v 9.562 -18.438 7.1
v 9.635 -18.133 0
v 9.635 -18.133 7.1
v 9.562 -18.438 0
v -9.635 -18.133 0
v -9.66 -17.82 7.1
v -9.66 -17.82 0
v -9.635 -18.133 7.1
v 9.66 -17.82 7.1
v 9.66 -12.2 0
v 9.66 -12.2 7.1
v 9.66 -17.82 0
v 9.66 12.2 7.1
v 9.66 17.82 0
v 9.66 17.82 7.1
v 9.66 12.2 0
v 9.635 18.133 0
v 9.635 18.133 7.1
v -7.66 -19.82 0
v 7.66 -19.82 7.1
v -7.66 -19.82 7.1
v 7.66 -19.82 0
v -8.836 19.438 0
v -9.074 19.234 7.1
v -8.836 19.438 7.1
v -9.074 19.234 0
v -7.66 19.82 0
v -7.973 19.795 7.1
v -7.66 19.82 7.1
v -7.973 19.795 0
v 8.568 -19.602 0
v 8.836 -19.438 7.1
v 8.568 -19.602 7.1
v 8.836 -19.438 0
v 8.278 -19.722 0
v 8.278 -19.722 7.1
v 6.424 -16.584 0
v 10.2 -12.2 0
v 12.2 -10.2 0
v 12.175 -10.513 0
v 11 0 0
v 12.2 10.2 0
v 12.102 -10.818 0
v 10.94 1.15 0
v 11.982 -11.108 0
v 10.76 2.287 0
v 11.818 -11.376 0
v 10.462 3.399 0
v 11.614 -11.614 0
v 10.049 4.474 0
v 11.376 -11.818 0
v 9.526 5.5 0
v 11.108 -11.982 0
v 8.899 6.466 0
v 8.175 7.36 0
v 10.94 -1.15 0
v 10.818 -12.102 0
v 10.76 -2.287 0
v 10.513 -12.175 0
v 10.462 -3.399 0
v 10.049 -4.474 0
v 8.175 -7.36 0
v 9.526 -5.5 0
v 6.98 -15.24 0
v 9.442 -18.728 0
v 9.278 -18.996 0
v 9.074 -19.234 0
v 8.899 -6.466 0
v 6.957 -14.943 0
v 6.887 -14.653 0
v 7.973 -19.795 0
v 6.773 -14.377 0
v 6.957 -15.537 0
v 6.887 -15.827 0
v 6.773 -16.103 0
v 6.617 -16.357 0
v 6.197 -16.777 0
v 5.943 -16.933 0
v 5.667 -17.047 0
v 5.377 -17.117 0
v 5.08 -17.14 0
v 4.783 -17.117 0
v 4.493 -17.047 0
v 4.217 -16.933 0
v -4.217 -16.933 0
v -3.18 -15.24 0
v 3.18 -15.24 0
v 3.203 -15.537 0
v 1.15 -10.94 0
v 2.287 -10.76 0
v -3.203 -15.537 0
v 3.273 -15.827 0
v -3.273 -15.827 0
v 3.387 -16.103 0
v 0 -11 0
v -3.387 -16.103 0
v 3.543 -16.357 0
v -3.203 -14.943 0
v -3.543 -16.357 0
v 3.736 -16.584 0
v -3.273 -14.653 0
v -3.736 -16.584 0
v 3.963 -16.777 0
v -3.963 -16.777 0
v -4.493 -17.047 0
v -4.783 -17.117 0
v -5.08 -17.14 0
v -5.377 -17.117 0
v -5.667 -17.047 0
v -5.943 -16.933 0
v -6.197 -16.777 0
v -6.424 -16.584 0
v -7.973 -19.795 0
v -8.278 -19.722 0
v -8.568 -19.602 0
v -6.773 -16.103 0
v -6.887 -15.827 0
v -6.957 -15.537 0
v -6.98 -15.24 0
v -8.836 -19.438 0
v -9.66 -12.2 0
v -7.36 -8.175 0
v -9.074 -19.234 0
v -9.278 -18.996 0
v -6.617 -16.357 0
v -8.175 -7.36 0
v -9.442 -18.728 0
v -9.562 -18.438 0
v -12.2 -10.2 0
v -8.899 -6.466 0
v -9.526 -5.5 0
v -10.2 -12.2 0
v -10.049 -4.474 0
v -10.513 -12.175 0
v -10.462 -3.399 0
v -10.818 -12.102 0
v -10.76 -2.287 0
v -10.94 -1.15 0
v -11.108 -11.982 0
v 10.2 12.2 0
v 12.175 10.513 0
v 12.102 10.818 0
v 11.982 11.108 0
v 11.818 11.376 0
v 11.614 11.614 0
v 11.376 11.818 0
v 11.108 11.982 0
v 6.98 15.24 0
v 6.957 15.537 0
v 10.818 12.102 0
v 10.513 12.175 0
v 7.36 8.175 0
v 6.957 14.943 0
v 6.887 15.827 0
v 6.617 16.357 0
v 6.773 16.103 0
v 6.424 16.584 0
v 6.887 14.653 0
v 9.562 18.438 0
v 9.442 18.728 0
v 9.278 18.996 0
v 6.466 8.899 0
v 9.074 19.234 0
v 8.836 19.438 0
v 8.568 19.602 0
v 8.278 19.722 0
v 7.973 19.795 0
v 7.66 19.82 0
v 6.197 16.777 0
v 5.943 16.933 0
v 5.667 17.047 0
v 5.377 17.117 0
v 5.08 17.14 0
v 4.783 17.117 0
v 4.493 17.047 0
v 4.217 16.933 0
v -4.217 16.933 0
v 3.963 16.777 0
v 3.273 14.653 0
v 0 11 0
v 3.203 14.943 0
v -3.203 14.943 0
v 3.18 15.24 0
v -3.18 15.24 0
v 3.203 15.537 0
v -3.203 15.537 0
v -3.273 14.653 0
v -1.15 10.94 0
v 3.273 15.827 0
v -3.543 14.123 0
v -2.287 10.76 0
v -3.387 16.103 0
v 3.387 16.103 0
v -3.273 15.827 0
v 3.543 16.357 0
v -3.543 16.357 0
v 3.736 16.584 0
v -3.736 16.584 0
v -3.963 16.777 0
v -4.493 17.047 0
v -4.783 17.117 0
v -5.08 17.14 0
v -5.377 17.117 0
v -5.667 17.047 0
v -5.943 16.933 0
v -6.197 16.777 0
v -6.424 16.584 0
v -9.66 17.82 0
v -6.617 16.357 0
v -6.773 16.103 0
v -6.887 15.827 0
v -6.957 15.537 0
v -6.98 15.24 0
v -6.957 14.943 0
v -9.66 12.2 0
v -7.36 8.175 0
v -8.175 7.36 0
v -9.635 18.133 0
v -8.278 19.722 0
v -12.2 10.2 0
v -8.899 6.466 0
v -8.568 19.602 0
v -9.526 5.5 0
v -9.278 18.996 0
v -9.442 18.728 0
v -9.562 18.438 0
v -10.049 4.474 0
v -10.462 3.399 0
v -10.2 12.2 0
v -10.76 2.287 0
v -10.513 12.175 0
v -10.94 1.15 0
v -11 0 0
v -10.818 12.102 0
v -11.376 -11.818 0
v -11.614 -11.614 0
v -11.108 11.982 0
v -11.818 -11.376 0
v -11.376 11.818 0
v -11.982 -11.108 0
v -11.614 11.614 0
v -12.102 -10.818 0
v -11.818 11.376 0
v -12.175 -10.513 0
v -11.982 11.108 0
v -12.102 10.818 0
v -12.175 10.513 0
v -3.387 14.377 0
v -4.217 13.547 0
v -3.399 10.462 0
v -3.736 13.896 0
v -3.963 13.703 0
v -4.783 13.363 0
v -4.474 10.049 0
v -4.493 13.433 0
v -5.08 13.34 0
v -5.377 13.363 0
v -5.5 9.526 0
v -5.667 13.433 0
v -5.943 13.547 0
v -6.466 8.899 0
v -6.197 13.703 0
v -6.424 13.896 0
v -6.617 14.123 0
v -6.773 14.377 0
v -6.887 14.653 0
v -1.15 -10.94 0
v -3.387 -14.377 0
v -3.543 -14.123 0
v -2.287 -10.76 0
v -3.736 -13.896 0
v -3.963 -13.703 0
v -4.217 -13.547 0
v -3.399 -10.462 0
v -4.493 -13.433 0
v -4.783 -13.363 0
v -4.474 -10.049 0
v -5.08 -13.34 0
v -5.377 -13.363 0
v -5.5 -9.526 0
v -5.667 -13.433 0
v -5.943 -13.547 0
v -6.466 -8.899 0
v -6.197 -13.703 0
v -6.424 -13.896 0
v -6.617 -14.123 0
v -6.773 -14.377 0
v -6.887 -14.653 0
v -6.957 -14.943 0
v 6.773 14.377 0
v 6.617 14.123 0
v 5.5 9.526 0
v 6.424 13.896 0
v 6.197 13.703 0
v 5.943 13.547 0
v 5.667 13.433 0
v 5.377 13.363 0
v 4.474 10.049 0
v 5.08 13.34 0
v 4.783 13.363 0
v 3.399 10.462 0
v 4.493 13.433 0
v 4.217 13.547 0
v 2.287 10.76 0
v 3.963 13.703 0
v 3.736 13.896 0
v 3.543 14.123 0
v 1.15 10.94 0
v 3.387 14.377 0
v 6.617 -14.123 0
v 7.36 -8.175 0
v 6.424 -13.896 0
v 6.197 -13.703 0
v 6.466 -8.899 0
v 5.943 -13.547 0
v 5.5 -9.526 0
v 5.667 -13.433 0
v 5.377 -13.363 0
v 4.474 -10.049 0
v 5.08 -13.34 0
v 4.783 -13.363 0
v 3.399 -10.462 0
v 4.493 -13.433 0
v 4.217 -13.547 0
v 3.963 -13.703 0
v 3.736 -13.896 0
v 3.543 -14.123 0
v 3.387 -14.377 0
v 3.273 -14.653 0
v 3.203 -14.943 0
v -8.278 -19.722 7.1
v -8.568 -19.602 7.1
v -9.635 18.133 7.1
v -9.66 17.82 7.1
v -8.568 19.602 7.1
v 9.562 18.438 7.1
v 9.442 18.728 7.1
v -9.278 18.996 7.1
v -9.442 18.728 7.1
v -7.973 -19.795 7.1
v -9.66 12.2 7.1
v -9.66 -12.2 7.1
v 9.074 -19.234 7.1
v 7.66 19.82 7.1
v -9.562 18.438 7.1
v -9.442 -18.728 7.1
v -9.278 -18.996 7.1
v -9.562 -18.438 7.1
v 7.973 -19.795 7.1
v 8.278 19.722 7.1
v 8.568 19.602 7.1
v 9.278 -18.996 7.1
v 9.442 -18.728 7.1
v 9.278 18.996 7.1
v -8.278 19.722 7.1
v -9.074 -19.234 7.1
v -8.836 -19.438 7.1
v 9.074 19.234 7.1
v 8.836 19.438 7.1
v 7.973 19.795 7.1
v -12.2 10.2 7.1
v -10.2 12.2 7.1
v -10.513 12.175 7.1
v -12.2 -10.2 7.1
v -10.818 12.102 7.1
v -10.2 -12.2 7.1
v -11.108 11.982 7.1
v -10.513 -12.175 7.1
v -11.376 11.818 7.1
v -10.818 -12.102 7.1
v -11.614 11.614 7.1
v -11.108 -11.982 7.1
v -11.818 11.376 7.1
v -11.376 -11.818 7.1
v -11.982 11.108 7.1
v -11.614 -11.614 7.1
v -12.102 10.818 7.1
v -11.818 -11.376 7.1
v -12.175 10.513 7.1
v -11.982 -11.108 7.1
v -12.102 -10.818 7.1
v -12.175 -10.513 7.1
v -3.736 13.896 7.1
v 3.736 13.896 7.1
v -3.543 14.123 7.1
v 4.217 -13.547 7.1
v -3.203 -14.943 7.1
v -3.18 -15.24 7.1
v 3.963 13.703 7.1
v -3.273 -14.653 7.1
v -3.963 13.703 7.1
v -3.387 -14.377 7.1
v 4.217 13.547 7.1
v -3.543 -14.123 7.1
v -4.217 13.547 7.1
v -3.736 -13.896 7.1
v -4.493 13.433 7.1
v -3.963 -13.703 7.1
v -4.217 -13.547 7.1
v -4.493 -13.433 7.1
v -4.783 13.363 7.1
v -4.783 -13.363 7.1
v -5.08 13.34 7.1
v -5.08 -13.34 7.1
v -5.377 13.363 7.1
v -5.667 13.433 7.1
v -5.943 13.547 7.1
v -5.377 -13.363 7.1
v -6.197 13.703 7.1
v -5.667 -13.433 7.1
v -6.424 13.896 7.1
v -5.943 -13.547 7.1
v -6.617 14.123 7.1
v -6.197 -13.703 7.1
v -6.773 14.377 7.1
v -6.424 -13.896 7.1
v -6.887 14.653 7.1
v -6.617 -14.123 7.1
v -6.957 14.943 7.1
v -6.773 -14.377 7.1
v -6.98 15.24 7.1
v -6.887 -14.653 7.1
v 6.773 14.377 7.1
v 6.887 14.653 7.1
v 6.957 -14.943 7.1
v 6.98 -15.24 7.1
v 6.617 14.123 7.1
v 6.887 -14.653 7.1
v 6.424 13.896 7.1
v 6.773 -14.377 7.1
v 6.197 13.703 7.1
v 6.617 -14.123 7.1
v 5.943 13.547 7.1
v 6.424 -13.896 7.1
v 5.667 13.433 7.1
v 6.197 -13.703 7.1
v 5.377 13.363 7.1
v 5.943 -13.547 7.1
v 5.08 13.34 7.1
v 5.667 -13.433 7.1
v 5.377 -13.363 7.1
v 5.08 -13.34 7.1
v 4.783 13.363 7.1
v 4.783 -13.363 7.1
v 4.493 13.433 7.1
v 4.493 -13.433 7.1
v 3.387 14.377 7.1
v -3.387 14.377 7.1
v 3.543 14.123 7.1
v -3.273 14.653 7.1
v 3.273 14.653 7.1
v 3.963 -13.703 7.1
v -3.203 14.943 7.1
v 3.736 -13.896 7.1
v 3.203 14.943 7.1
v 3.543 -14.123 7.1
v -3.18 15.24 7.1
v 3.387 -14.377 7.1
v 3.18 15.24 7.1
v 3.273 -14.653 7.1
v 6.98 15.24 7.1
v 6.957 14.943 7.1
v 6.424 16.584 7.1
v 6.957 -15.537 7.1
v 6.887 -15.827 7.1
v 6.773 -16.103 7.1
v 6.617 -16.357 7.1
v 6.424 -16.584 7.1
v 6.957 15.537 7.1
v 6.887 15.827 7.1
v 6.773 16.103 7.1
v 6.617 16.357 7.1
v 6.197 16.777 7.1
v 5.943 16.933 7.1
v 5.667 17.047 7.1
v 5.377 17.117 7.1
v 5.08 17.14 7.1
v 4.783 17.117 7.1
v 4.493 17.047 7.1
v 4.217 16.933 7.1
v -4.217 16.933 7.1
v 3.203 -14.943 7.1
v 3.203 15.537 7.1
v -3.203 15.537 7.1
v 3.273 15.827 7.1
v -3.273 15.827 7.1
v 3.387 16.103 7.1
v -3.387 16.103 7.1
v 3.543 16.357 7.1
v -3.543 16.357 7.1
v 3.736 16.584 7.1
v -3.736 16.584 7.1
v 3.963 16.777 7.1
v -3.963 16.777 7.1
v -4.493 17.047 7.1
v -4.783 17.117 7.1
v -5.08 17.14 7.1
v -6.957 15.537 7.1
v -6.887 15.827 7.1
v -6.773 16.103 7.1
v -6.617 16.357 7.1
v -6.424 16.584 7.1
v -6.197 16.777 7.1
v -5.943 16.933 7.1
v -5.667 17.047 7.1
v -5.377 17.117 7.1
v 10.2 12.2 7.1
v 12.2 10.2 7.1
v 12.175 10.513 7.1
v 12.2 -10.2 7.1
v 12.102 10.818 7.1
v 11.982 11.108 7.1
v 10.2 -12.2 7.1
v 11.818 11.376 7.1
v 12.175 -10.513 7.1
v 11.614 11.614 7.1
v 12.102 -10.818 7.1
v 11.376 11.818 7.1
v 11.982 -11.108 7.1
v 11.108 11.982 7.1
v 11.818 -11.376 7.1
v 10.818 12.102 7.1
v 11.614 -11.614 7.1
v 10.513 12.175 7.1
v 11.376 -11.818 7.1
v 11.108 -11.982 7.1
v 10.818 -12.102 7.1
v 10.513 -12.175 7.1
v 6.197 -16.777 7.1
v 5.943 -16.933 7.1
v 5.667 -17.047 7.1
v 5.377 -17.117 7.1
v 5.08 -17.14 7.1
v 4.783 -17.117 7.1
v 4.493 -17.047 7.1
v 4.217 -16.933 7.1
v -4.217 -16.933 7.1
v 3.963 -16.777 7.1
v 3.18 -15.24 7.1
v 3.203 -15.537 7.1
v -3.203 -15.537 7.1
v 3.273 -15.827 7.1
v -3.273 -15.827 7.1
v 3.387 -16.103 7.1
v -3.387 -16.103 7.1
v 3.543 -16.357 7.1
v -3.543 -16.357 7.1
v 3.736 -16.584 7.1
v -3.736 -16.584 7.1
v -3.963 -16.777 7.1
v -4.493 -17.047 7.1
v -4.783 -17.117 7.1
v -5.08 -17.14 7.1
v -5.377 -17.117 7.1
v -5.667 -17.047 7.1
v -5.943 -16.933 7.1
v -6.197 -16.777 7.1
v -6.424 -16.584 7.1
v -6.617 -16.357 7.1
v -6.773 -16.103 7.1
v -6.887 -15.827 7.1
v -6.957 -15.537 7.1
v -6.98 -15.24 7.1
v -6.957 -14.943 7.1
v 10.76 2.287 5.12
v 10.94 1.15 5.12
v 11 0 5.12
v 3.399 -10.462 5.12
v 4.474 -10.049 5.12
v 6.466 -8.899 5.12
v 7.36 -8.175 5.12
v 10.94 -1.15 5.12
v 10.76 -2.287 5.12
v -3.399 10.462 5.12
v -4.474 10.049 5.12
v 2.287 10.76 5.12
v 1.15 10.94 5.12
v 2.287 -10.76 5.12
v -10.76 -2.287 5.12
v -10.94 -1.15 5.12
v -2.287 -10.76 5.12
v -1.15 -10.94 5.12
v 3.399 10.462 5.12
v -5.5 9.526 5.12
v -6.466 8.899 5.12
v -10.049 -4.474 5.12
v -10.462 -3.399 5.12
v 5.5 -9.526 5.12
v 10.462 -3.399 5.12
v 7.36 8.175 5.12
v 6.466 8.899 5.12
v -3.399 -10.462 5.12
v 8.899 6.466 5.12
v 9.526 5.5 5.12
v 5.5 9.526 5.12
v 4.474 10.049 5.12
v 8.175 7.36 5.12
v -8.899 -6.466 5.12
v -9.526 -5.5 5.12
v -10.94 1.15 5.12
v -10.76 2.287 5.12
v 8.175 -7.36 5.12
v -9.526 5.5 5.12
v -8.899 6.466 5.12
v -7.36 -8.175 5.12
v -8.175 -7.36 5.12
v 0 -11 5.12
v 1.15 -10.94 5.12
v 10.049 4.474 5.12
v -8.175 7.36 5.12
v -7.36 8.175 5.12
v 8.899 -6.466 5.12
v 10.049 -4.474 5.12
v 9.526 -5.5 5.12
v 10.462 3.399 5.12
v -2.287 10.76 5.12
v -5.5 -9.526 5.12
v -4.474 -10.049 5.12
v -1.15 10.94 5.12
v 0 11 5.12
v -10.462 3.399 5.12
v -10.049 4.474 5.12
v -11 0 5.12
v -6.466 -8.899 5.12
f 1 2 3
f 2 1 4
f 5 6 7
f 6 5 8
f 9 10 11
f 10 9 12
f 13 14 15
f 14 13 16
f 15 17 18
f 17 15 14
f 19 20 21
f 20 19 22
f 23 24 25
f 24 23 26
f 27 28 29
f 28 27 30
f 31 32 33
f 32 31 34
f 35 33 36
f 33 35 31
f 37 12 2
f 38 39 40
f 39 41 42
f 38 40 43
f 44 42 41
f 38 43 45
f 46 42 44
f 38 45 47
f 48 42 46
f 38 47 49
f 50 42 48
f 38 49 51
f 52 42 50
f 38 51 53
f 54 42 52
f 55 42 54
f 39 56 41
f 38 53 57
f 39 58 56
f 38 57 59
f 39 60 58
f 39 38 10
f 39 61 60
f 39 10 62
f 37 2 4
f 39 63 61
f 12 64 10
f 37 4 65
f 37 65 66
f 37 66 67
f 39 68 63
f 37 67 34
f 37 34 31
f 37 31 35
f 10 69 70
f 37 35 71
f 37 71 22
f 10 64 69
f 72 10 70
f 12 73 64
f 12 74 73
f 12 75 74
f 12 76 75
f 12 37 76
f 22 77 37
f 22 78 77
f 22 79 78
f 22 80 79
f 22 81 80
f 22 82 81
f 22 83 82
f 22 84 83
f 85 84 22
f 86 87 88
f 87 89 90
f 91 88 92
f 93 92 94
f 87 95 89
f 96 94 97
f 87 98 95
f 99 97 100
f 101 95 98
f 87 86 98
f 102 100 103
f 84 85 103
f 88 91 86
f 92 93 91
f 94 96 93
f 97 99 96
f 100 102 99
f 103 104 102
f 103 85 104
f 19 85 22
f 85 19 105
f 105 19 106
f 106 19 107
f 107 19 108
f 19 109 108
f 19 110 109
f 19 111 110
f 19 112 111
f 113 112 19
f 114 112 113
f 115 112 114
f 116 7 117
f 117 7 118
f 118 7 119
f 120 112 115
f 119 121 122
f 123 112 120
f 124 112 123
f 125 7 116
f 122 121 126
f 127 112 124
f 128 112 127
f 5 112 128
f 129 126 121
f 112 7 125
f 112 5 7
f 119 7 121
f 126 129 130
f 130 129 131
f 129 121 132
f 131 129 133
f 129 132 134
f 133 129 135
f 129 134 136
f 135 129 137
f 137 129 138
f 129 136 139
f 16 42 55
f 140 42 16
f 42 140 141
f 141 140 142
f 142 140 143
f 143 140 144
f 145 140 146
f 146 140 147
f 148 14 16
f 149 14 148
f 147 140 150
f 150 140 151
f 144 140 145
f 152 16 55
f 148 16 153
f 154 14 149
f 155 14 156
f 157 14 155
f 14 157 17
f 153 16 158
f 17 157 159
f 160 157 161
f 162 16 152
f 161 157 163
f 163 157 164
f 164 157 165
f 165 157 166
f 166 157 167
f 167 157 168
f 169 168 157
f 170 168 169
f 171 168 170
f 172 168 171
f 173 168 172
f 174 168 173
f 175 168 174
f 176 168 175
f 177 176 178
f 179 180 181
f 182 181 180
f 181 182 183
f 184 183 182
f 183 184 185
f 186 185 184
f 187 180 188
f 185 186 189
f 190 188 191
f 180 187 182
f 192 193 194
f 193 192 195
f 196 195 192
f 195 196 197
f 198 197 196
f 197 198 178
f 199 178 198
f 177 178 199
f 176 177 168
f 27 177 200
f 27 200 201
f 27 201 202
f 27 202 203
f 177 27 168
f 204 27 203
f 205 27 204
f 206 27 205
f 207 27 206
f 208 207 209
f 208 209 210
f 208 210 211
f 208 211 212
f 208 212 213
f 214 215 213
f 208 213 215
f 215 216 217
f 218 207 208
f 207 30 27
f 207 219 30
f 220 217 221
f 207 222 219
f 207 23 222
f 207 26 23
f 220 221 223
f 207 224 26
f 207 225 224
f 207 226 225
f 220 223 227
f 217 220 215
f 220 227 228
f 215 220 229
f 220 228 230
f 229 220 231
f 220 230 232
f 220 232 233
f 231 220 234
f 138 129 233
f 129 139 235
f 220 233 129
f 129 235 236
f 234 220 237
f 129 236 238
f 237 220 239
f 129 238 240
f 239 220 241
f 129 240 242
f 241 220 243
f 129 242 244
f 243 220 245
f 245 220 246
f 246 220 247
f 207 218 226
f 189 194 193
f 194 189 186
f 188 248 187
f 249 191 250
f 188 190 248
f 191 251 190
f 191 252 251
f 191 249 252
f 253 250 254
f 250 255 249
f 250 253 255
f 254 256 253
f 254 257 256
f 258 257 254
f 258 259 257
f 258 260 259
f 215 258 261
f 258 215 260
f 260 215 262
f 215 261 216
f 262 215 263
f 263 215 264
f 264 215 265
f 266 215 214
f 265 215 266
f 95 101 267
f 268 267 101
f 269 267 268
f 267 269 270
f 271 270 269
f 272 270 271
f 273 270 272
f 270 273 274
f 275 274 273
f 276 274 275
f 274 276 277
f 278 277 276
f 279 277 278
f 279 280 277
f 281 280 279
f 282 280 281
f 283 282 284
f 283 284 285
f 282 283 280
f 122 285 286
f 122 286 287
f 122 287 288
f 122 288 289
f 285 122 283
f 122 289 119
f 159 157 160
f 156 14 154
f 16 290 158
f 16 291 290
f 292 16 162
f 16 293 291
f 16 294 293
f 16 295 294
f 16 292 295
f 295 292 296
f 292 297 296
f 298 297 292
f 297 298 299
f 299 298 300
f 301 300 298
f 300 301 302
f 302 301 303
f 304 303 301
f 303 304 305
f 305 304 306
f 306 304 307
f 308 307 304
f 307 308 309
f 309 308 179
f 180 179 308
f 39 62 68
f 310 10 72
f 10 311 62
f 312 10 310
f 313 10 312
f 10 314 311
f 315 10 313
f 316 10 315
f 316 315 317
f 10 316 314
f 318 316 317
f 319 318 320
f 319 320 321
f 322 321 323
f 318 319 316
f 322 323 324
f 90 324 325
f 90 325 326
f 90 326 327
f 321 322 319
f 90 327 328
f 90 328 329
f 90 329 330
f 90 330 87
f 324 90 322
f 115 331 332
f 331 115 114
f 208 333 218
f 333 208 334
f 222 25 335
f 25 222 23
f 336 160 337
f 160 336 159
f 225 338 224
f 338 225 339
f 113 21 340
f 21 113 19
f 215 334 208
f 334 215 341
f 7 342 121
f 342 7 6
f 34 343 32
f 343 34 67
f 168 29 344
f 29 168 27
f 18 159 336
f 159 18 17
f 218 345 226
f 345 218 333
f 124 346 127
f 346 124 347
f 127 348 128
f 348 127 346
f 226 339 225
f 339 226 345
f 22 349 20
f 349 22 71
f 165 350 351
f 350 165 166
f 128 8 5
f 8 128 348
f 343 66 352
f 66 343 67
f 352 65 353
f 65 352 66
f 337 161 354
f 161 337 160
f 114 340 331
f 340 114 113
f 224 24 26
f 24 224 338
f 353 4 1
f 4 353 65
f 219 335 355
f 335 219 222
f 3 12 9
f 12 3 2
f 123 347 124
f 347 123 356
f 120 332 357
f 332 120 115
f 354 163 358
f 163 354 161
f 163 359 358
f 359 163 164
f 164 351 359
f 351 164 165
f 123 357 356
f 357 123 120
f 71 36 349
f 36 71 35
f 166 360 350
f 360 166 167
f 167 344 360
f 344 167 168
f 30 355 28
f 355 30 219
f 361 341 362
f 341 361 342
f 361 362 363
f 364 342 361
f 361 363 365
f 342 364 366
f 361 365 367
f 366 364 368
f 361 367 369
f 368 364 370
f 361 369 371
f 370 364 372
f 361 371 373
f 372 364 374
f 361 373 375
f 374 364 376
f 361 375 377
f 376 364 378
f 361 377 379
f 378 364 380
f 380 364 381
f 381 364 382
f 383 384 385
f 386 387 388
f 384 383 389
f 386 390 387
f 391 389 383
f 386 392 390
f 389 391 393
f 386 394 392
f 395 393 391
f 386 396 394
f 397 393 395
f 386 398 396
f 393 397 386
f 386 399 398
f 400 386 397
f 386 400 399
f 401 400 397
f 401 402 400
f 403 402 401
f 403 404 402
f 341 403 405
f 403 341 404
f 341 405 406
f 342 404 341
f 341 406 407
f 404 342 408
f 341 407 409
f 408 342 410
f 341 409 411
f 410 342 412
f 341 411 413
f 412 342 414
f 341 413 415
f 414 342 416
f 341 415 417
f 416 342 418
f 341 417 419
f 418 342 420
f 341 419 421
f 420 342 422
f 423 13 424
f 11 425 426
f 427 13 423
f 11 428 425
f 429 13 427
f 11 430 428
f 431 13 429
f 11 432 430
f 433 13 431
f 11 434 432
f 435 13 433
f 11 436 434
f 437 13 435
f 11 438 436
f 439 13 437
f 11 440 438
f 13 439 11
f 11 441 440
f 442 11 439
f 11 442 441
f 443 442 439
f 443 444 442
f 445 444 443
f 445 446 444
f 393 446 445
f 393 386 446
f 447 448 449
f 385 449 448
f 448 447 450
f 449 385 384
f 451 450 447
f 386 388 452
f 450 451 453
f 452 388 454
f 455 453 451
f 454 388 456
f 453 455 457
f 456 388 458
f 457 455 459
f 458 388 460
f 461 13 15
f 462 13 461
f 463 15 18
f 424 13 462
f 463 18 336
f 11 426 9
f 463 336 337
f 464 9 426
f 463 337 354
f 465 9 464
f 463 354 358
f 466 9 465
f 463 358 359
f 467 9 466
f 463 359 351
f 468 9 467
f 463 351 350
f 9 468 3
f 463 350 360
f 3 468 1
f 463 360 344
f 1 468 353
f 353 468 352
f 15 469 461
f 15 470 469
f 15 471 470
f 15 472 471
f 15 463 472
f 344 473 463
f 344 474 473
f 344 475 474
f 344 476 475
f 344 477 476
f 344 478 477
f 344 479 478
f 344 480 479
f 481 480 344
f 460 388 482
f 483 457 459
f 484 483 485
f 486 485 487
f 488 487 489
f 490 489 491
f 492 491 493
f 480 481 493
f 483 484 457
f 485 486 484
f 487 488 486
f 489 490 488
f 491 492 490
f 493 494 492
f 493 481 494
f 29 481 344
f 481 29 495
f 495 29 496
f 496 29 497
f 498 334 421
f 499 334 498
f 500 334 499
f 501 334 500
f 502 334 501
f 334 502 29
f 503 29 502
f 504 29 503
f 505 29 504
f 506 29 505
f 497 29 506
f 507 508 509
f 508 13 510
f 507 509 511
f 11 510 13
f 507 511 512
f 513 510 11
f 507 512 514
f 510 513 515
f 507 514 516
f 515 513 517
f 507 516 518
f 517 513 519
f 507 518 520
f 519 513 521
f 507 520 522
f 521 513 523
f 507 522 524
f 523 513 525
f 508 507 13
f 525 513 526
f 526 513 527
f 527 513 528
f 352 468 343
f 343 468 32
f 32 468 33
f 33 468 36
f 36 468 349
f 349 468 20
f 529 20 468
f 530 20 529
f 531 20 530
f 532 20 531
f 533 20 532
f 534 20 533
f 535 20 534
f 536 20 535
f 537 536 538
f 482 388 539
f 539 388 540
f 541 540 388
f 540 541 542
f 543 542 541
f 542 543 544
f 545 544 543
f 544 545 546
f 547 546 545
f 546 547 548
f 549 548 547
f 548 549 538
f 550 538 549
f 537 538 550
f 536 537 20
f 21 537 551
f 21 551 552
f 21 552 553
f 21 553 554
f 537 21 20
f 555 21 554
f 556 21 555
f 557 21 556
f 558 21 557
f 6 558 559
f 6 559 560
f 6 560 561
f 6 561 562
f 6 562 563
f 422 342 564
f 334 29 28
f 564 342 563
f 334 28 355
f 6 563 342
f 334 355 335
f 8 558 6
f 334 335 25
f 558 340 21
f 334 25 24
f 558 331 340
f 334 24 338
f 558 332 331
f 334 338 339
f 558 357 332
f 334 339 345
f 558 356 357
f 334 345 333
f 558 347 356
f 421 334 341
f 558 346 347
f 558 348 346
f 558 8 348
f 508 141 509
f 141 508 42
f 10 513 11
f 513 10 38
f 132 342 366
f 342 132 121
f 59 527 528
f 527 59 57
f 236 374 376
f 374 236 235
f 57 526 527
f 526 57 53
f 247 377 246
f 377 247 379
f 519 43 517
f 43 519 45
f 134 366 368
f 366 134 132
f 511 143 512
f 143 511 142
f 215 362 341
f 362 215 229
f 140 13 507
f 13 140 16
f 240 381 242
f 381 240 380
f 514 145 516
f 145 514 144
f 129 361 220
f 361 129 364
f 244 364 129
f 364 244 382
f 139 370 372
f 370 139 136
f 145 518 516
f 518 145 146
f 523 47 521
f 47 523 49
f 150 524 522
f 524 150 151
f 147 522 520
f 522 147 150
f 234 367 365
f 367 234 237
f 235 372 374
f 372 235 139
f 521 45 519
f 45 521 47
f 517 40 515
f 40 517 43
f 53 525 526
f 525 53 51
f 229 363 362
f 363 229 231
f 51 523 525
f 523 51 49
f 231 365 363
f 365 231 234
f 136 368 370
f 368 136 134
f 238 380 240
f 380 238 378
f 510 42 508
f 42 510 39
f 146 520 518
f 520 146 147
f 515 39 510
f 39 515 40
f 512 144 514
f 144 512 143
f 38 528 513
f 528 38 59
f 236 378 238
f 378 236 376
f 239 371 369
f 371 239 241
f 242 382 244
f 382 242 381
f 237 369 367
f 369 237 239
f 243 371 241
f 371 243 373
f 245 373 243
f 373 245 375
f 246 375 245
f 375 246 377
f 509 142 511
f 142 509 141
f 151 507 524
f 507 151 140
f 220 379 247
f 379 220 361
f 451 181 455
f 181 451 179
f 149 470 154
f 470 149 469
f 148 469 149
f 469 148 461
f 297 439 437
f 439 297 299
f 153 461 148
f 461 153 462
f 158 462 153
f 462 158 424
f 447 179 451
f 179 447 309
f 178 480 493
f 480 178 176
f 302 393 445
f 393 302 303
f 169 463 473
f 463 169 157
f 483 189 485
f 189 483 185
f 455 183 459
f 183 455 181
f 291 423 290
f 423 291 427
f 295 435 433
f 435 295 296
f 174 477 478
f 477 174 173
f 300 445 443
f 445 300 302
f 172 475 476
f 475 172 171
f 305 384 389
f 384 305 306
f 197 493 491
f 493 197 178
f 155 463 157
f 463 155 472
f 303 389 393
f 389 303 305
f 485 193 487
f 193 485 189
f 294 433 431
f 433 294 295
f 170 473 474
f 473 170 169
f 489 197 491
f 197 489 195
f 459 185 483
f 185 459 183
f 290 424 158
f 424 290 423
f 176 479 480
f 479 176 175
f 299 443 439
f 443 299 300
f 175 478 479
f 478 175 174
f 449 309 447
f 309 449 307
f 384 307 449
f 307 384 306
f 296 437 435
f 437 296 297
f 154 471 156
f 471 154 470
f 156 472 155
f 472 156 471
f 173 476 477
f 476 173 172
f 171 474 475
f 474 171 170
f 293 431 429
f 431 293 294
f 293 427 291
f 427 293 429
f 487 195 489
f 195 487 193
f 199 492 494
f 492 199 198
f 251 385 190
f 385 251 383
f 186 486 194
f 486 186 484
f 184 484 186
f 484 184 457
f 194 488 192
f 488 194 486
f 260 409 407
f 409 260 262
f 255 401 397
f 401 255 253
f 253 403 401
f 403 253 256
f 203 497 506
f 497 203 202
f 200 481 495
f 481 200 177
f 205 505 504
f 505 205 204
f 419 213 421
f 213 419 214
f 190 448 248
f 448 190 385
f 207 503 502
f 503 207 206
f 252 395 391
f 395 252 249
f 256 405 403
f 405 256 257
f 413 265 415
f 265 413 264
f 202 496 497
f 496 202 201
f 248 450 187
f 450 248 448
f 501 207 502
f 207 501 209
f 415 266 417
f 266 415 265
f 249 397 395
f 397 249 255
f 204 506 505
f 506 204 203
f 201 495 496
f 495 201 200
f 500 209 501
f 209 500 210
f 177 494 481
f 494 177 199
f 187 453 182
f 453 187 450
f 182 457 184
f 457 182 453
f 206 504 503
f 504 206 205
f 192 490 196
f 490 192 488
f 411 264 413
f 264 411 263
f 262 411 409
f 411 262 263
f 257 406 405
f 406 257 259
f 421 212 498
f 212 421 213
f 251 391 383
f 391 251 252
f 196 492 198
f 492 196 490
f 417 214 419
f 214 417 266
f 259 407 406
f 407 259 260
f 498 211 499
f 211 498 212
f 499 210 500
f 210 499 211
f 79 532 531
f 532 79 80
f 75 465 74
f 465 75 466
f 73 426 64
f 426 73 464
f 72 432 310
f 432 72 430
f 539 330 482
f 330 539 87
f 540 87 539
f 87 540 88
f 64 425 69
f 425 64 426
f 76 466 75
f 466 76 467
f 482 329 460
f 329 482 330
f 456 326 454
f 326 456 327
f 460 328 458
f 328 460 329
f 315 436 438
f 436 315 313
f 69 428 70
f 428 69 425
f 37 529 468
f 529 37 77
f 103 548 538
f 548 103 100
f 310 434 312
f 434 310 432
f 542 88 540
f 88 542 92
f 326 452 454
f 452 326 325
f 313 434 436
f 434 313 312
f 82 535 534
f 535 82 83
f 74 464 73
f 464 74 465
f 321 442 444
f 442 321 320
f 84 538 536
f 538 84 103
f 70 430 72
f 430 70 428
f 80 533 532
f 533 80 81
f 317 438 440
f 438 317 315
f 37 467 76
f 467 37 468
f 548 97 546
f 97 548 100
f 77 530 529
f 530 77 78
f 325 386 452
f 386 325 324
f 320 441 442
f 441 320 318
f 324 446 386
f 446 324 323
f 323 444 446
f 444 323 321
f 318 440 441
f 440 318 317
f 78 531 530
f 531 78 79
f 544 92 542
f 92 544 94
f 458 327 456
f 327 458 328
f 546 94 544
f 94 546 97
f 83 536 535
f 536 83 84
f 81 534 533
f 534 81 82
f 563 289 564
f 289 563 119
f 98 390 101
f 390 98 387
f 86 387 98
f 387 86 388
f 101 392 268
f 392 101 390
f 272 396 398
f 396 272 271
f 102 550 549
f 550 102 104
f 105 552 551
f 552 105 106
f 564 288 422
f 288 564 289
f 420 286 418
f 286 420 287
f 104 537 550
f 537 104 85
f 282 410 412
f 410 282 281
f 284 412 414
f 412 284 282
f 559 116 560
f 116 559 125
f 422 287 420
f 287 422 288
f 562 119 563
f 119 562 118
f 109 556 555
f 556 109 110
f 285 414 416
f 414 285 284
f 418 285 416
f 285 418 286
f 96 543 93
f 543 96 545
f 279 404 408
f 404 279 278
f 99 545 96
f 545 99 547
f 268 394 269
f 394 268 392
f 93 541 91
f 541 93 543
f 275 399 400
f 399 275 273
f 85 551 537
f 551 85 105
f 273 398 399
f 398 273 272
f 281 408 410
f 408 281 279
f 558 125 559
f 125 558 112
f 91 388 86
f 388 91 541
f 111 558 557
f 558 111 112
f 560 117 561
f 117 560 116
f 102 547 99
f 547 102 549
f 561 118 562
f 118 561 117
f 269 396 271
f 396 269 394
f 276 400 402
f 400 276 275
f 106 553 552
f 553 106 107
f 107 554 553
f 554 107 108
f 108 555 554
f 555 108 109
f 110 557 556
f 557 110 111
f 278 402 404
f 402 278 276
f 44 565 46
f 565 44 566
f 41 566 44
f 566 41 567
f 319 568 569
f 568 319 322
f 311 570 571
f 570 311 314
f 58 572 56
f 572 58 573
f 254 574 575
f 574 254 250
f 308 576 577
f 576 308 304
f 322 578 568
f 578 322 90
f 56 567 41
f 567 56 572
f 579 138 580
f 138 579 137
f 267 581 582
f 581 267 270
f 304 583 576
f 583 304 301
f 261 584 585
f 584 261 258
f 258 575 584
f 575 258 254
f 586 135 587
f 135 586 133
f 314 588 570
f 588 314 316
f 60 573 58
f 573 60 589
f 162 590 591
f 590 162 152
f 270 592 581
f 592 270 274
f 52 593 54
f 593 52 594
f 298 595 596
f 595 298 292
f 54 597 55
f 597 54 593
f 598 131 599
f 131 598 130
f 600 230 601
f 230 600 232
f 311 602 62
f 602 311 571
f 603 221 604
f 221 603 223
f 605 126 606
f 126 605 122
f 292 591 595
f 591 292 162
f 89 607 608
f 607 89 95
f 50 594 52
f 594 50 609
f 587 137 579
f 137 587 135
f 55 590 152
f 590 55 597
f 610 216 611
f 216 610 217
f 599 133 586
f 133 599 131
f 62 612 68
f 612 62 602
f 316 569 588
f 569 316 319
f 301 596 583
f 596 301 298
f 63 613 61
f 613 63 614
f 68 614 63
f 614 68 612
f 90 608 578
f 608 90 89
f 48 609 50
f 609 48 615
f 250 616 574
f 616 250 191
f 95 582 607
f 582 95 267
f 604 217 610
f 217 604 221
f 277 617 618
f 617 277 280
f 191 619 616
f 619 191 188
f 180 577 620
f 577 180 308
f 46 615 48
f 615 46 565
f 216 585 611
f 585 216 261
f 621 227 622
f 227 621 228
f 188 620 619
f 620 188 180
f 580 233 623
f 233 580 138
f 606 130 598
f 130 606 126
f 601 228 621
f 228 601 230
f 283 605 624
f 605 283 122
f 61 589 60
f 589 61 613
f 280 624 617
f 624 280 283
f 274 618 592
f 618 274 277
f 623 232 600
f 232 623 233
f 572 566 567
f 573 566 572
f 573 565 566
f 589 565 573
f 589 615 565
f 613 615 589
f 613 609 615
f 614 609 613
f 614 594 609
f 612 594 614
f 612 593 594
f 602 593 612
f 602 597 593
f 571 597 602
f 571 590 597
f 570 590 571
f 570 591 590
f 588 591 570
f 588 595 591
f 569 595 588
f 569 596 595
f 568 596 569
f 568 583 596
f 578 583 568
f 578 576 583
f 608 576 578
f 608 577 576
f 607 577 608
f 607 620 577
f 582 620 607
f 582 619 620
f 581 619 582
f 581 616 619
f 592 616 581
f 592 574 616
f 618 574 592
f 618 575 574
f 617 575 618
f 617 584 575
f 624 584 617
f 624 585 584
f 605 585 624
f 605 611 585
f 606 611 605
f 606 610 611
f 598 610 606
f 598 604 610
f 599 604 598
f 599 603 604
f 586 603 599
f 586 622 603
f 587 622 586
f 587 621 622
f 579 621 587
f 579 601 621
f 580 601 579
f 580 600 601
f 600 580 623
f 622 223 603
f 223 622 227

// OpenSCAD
// file: ../configuration.scad
$fn=40; // model faces resolution.

//OBECNE PARAMETRY 
//----------------------------------------------------------------
//----------------------------------------------------------------

vyska_krystalu=15;
vyska_sipm=2;
presah_krystalu=6;
rezerva_nad_krystalem=5;
vyska_drzaku_krystalu=vyska_krystalu-presah_krystalu-2;

hrana_krystalu=6; //čistá hrana

// big-big
//zakladna_krystalu_x=23.7; //1.5mm rezerva hrana SIPM je 22 mm
//zakladna_krystalu_y=23.7;
// big-small
zakladna_krystalu_x=22.0; //1.5mm rezerva hrana SIPM je 22 mm
zakladna_krystalu_y=22.0;
sila_steny=1.2;
sila_materialu_zakladny=7; //1.6;


vyska_zapusti_pro_PCB=0; //výčka krycího matriálu pro PCB a zároveň pro vytvoření vany pro zalití silikonem, kvůli světlotěsnoti.
vyska_SIPM_nad_PCB=2.4; //výška celého SIPM senzoru
tolerance_pro_dotazeni_k_SIPM=-0.5; // kvůli dotažení krystalu k SIPM
velikost_modulu_x=2; //počet der
velikost_modulu_y=4;
rotec_der_modulu=10.16;

vyska_matky=3;
sirka_matky=6.7;
prumer_sroubu=3.6;//3.4;
prumer_hlavy_sroubu=6;
vyska_hlavy_sroubu=5;

//Pro díl SIPMBOX01C_D02
D02_velikost_modulu_x=3; //počet der
D02_velikost_modulu_y=4;
D02_vyska_bocniho_prekryvu=25;

//Pro díl SIPMBOX01C_D07
D07_vyska=6;
// main file
include <../configuration.scad>
 
/*
difference (){
SIPMBOX01C_D05();
 
translate([-(hrana_krystalu)/2,-(hrana_krystalu)/2,0])
         
   cube([100,100,100]);   
    
}
*/

/*
difference (){
      union() {
translate([0,0,7])
          
          translate([-rotec_der_modulu/2,0,0])
          SIPMBOX01C_D01();
          
         
SIPMBOX01C_D02();

translate([-rotec_der_modulu/2,0,0])
SIPMBOX01C_D06();


SIPMBOX01C_D07();
 
 
translate([-10/2,-(D02_velikost_modulu_y+2)*rotec_der_modulu/2,sila_materialu_zakladny+vyska_krystalu+rezerva_nad_krystalem])          
SIPMBOX01C_D08();          
          

translate([-rotec_der_modulu/2,0,0])
SIPMBOX01C_D03();

translate([-(hrana_krystalu)/2,-(hrana_krystalu)/2,0])
cube([hrana_krystalu,hrana_krystalu,vyska_krystalu+vyska_sipm]);
          }
   cube([100,100,100]);       
          
          }

//*/



 SIPMBOX01C_D01();

//SIPMBOX01C_D06();

//SIPMBOX01C_D02();


 

module SIPMBOX01C_D08()
{
  vyska_sloupku=3;
   difference () 
    {
   union()       {   
    cube([10,(D02_velikost_modulu_y+2)*rotec_der_modulu,2],center=false); 
        translate([10/2,0,0]) 
        cylinder (h = 3, r= 10/2, $fn=20);
        
     translate([10/2,(D02_velikost_modulu_y+2)*rotec_der_modulu,0]) 
        cylinder (h = 3, r= 10/2, $fn=20);
    }
    
     translate([10/2,0,-0.01]) 
            cylinder (h = vyska_sloupku+1, r= (prumer_sroubu+0.2)/2, $fn=40);
    
     translate([10/2,(D02_velikost_modulu_y+2)*rotec_der_modulu,-0.01]) 
            cylinder (h = vyska_sloupku+1, r= (prumer_sroubu+0.2)/2, $fn=40);
    
    
    }
    
    
       
}





module SIPMBOX01C_D07() //drzak na ALBASE
{
  difference (){
      union() {
 //Zakladna
 translate([-((D02_velikost_modulu_x) * rotec_der_modulu+2*sila_materialu_zakladny)/2,-((D02_velikost_modulu_y+2) * rotec_der_modulu+2*sila_materialu_zakladny)/2,0])
 
 minkowski()
{
  cube([(D02_velikost_modulu_x) * rotec_der_modulu+2*sila_materialu_zakladny,(D02_velikost_modulu_y+2) * rotec_der_modulu+2*sila_materialu_zakladny,D07_vyska]);
  cylinder(r=2,h=0.1);
}







}

//otvor na cely scintilacni detektor 
translate([-(D02_velikost_modulu_x * rotec_der_modulu+2*sila_materialu_zakladny)/2+2-1,-(D02_velikost_modulu_y * rotec_der_modulu+2*sila_materialu_zakladny)/2+2-1,0])
 
 minkowski()
{
  cube([D02_velikost_modulu_x * rotec_der_modulu-2*2+2+2*sila_materialu_zakladny,D02_velikost_modulu_y * rotec_der_modulu-2*2+2+2*sila_materialu_zakladny,D07_vyska]);
  cylinder(r=2,h=0.1);
}


//otvor na sroub 1
translate([-(D02_velikost_modulu_x-1)*rotec_der_modulu/2,(D02_velikost_modulu_y+2)*rotec_der_modulu/2,-0.01]) 
    translate([0,0,-0.01]) 
        {
        cylinder (h = D07_vyska+0.12, r= (prumer_sroubu+0.2)/2, $fn=40);
    
        cylinder (h = vyska_matky, r= (sirka_matky+0.2)/2, $fn=6);
      
        }

//otvor na sroub 2
translate([(D02_velikost_modulu_x-1)*rotec_der_modulu/2,(D02_velikost_modulu_y+2)*rotec_der_modulu/2,-0.01]) 
    translate([0,0,-0.01]) 
        {
        cylinder (h = D07_vyska+0.12, r= (prumer_sroubu+0.2)/2, $fn=40);
    
        cylinder (h = vyska_matky, r= (sirka_matky+0.2)/2, $fn=6);
      
        }

//otvor na sroub 3
translate([-(D02_velikost_modulu_x-1)*rotec_der_modulu/2,-(D02_velikost_modulu_y+2)*rotec_der_modulu/2,-0.01]) 
    translate([0,0,-0.01]) 
        {
        cylinder (h = D07_vyska+0.12, r= (prumer_sroubu+0.2)/2, $fn=40);
    
        cylinder (h = vyska_matky, r= (sirka_matky+0.2)/2, $fn=6);
      
        }

//otvor na sroub 4
translate([(D02_velikost_modulu_x-1)*rotec_der_modulu/2,-(D02_velikost_modulu_y+2)*rotec_der_modulu/2,-0.01]) 
    translate([0,0,-0.01]) 
        {
        cylinder (h = D07_vyska+0.12, r= (prumer_sroubu+0.2)/2, $fn=40);
    
        cylinder (h = vyska_matky, r= (sirka_matky+0.2)/2, $fn=6);
      
        }
 
//Otvor na uchytny sroub 1
translate([0,(D02_velikost_modulu_y+2)*rotec_der_modulu/2,0]) 
    translate([0,0,-0.01]) 
        {
        cylinder (h = D07_vyska+0.12, r= (prumer_sroubu+0.2)/2, $fn=40);
         cylinder (h = vyska_hlavy_sroubu, r= (prumer_hlavy_sroubu+0.2)/2, $fn=40);
                      
        }

//Otvor na uchytny sroub 2
translate([0,-(D02_velikost_modulu_y+2)*rotec_der_modulu/2,-0.01]) 
    translate([0,0,-0.01]) 
        {
        cylinder (h = D07_vyska+0.12, r= (prumer_sroubu+0.2)/2, $fn=40);
   cylinder (h = vyska_hlavy_sroubu, r= (prumer_hlavy_sroubu+0.2)/2, $fn=40);
        }      
        
 
} 
}           
         

module SIPMBOX01C_D05() //drzak krystalu
{
  difference (){
      union() {
 //Zakladna
 translate([-(velikost_modulu_x * rotec_der_modulu)/2+2+1/2,-(velikost_modulu_y * rotec_der_modulu)/2+2+1/2,0])
 
 minkowski()
{
  cube([velikost_modulu_x * rotec_der_modulu-2*2-1,velikost_modulu_y * rotec_der_modulu-2*2-1,sila_materialu_zakladny]);
  cylinder(r=2,h=0.1);
}


//drzak krystalu
 translate([-(zakladna_krystalu_x+4*sila_steny)/2+2,-(zakladna_krystalu_y+4*sila_steny)/2+2,0])
 
 minkowski()
{
  cube([zakladna_krystalu_x-2*2+4*sila_steny,zakladna_krystalu_y-2*2+4*sila_steny,vyska_drzaku_krystalu+1.5]);
  cylinder(r=2,h=0.1);
}
}

//otvor pro dilec 01D
 translate([-(zakladna_krystalu_x+2*sila_steny+1.5)/2+2,-(zakladna_krystalu_y+2*sila_steny+1.5)/2+2,0])
 
 minkowski()
{
  cube([zakladna_krystalu_x-2*2+2*sila_steny+1.5,zakladna_krystalu_y-2*2+2*sila_steny+1.5,vyska_drzaku_krystalu]);
  cylinder(r=2,h=0.1);
}


//otvor na sroub 1
translate([(velikost_modulu_x-1)*rotec_der_modulu/2,(velikost_modulu_y-1)*rotec_der_modulu/2,-0.01]) 
 
 translate([0,0,-0.01]) 
        cylinder (h = sila_materialu_zakladny+0.12, r= (prumer_sroubu+0.2)/2, $fn=40);


 //otvor na sroub 2
    translate([-(velikost_modulu_x-1)*rotec_der_modulu/2,(velikost_modulu_y-1)*rotec_der_modulu/2,-0.01]) 
      translate([0,0,-0.01]) 
        cylinder (h = sila_materialu_zakladny+0.12, r= (prumer_sroubu+0.2)/2, $fn=40);

    //otvor na sroub 3
    translate([(velikost_modulu_x-1)*rotec_der_modulu/2,-(velikost_modulu_y-1)*rotec_der_modulu/2,-0.01]) 
      translate([0,0,-0.01]) 
        cylinder (h = sila_materialu_zakladny+0.12, r= (prumer_sroubu+0.2)/2, $fn=40);
//otvor na sroub 4
    translate([-(velikost_modulu_x-1)*rotec_der_modulu/2,-(velikost_modulu_y-1)*rotec_der_modulu/2,-0.01]) 
      translate([0,0,-0.01]) 
        cylinder (h = sila_materialu_zakladny+0.12, r= (prumer_sroubu+0.2)/2, $fn=40);
 
 
 //otvor na krystal
 
 translate([-(zakladna_krystalu_x)/2,-(zakladna_krystalu_y)/2,0])
 cube([zakladna_krystalu_x,zakladna_krystalu_y,vyska_drzaku_krystalu+0.12]);
} 
} 



module SIPMBOX01C_D03() //vrchní kryt
{
  difference (){
      union() {
 //Zakladna
 translate([-(velikost_modulu_x * rotec_der_modulu+2*sila_materialu_zakladny)/2+2,-(velikost_modulu_y * rotec_der_modulu+2*sila_materialu_zakladny)/2+2,0])
 
 minkowski()
{
  cube([velikost_modulu_x * rotec_der_modulu-2*2+2*sila_materialu_zakladny,velikost_modulu_y * rotec_der_modulu-2*2+2*sila_materialu_zakladny,sila_materialu_zakladny+vyska_krystalu+rezerva_nad_krystalem]);
  cylinder(r=2,h=0.1);
}


}

//odstranění vnitřního prostoru ve tvaru krychle
 translate([-(velikost_modulu_x * rotec_der_modulu)/2,-(velikost_modulu_y * rotec_der_modulu)/2,sila_materialu_zakladny])
cube([velikost_modulu_x * rotec_der_modulu,velikost_modulu_y * rotec_der_modulu,sila_materialu_zakladny+vyska_krystalu+rezerva_nad_krystalem]);


 
} 
} 

module SIPMBOX01C_D02() //kryt ze spoda
{
  difference (){
      union() {
 //Zakladna
 translate([-(D02_velikost_modulu_x * rotec_der_modulu+2*sila_materialu_zakladny)/2+2,-(D02_velikost_modulu_y * rotec_der_modulu+2*sila_materialu_zakladny)/2+2,0])
 
 minkowski()
{
  cube([D02_velikost_modulu_x * rotec_der_modulu-2*2+2*sila_materialu_zakladny,D02_velikost_modulu_y * rotec_der_modulu-2*2+2*sila_materialu_zakladny,sila_materialu_zakladny+D02_vyska_bocniho_prekryvu]);
  cylinder(r=2,h=0.1);
}



}

 translate([-(D02_velikost_modulu_x * rotec_der_modulu)/2-1/2,-(D02_velikost_modulu_y * rotec_der_modulu)/2-1/2,sila_materialu_zakladny/3*2])
#cube([D02_velikost_modulu_x * rotec_der_modulu+1,D02_velikost_modulu_y * rotec_der_modulu+1,sila_materialu_zakladny+D02_vyska_bocniho_prekryvu]);
for(i=[0:2:12]) 
  translate([0,i-12/2,sila_materialu_zakladny+D02_vyska_bocniho_prekryvu]) rotate([90,0,90]) cylinder(r=0.7,h=20);

} 
} 
 
 module SIPMBOX01C_D01() //drzak krystalu
{
  difference (){
      union() {
 //Zakladna
 translate([-(velikost_modulu_x * rotec_der_modulu)/2+2+1/2,-(velikost_modulu_y * rotec_der_modulu)/2+2+1/2,0])
 
 minkowski()
{
  cube([velikost_modulu_x * rotec_der_modulu-2*2-1,velikost_modulu_y * rotec_der_modulu-2*2-1,sila_materialu_zakladny]);
  cylinder(r=2,h=0.1);
}


//drzak krystalu
 translate([-(zakladna_krystalu_x+2*sila_steny)/2+2,-(zakladna_krystalu_y+2*sila_steny)/2+2,0])
 
 minkowski()
{
  cube([zakladna_krystalu_x-2*2+2*sila_steny,zakladna_krystalu_y-2*2+2*sila_steny,vyska_drzaku_krystalu]);
  cylinder(r=2,h=0.1);
}
}
//otvor na sroub 1
translate([(velikost_modulu_x-1)*rotec_der_modulu/2,(velikost_modulu_y-1)*rotec_der_modulu/2,-0.01]) 
 
 translate([0,0,-0.01]) 
        cylinder (h = sila_materialu_zakladny+0.12, r= (prumer_sroubu+0.2)/2, $fn=40);


 //otvor na sroub 2
    translate([-(velikost_modulu_x-1)*rotec_der_modulu/2,(velikost_modulu_y-1)*rotec_der_modulu/2,-0.01]) 
      translate([0,0,-0.01]) 
        cylinder (h = sila_materialu_zakladny+0.12, r= (prumer_sroubu+0.2)/2, $fn=40);

    //otvor na sroub 3
    translate([(velikost_modulu_x-1)*rotec_der_modulu/2,-(velikost_modulu_y-1)*rotec_der_modulu/2,-0.01]) 
      translate([0,0,-0.01]) 
        cylinder (h = sila_materialu_zakladny+0.12, r= (prumer_sroubu+0.2)/2, $fn=40);
//otvor na sroub 4
    translate([-(velikost_modulu_x-1)*rotec_der_modulu/2,-(velikost_modulu_y-1)*rotec_der_modulu/2,-0.01]) 
      translate([0,0,-0.01]) 
        cylinder (h = sila_materialu_zakladny+0.12, r= (prumer_sroubu+0.2)/2, $fn=40);
 
 
 //otvor na krystal
 
 //translate([-(zakladna_krystalu_x)/2,-(zakladna_krystalu_y)/2,-sila_steny])
 translate([0,0,-2])
 cylinder (h = vyska_drzaku_krystalu+0.12, r= zakladna_krystalu_x/2, $fn=60);
//#cube([zakladna_krystalu_x,zakladna_krystalu_y,vyska_drzaku_krystalu+0.12]);
} 
} 

module SIPMBOX01C_D06() //drzak krystalu
{
  difference (){
      union() {
 //Zakladna
 translate([-(velikost_modulu_x * rotec_der_modulu)/2+2+1/2,-(velikost_modulu_y * rotec_der_modulu)/2+2+1/2,0])
 
 minkowski()
{
  cube([velikost_modulu_x * rotec_der_modulu-2*2-1,velikost_modulu_y * rotec_der_modulu-2*2-1,sila_materialu_zakladny]);
  cylinder(r=2,h=0.1);
}


//drzak krystalu
 translate([-(zakladna_krystalu_x+2*sila_steny)/2+2,-(zakladna_krystalu_y+2*sila_steny)/2+2,0])
 
 minkowski()
{
  cube([zakladna_krystalu_x-2*2+2*sila_steny,zakladna_krystalu_y-2*2+2*sila_steny,4]);
  cylinder(r=2,h=0.1);
}
}
//otvor na sroub 1
translate([(velikost_modulu_x-1)*rotec_der_modulu/2,(velikost_modulu_y-1)*rotec_der_modulu/2,-0.01]) 
 
 translate([0,0,-0.01]) 
        cylinder (h = sila_materialu_zakladny+0.12, r= (prumer_sroubu+0.2)/2, $fn=40);


 //otvor na sroub 2
    translate([-(velikost_modulu_x-1)*rotec_der_modulu/2,(velikost_modulu_y-1)*rotec_der_modulu/2,-0.01]) 
      translate([0,0,-0.01]) 
        cylinder (h = sila_materialu_zakladny+0.12, r= (prumer_sroubu+0.2)/2, $fn=40);

    //otvor na sroub 3
    translate([(velikost_modulu_x-1)*rotec_der_modulu/2,-(velikost_modulu_y-1)*rotec_der_modulu/2,-0.01]) 
      translate([0,0,-0.01]) 
        cylinder (h = sila_materialu_zakladny+0.12, r= (prumer_sroubu+0.2)/2, $fn=40);
//otvor na sroub 4
    translate([-(velikost_modulu_x-1)*rotec_der_modulu/2,-(velikost_modulu_y-1)*rotec_der_modulu/2,-0.01]) 
      translate([0,0,-0.01]) 
        cylinder (h = sila_materialu_zakladny+0.12, r= (prumer_sroubu+0.2)/2, $fn=40);
 
 
 //otvor na krystal
 
 translate([0,0,-2])
 cylinder (h = vyska_drzaku_krystalu+0.12, r= zakladna_krystalu_x/2, $fn=60);

// translate([-(zakladna_krystalu_x)/2,-(zakladna_krystalu_y)/2,-sila_steny])
// cube([zakladna_krystalu_x,zakladna_krystalu_y,vyska_drzaku_krystalu+0.12]);
} 
}  
